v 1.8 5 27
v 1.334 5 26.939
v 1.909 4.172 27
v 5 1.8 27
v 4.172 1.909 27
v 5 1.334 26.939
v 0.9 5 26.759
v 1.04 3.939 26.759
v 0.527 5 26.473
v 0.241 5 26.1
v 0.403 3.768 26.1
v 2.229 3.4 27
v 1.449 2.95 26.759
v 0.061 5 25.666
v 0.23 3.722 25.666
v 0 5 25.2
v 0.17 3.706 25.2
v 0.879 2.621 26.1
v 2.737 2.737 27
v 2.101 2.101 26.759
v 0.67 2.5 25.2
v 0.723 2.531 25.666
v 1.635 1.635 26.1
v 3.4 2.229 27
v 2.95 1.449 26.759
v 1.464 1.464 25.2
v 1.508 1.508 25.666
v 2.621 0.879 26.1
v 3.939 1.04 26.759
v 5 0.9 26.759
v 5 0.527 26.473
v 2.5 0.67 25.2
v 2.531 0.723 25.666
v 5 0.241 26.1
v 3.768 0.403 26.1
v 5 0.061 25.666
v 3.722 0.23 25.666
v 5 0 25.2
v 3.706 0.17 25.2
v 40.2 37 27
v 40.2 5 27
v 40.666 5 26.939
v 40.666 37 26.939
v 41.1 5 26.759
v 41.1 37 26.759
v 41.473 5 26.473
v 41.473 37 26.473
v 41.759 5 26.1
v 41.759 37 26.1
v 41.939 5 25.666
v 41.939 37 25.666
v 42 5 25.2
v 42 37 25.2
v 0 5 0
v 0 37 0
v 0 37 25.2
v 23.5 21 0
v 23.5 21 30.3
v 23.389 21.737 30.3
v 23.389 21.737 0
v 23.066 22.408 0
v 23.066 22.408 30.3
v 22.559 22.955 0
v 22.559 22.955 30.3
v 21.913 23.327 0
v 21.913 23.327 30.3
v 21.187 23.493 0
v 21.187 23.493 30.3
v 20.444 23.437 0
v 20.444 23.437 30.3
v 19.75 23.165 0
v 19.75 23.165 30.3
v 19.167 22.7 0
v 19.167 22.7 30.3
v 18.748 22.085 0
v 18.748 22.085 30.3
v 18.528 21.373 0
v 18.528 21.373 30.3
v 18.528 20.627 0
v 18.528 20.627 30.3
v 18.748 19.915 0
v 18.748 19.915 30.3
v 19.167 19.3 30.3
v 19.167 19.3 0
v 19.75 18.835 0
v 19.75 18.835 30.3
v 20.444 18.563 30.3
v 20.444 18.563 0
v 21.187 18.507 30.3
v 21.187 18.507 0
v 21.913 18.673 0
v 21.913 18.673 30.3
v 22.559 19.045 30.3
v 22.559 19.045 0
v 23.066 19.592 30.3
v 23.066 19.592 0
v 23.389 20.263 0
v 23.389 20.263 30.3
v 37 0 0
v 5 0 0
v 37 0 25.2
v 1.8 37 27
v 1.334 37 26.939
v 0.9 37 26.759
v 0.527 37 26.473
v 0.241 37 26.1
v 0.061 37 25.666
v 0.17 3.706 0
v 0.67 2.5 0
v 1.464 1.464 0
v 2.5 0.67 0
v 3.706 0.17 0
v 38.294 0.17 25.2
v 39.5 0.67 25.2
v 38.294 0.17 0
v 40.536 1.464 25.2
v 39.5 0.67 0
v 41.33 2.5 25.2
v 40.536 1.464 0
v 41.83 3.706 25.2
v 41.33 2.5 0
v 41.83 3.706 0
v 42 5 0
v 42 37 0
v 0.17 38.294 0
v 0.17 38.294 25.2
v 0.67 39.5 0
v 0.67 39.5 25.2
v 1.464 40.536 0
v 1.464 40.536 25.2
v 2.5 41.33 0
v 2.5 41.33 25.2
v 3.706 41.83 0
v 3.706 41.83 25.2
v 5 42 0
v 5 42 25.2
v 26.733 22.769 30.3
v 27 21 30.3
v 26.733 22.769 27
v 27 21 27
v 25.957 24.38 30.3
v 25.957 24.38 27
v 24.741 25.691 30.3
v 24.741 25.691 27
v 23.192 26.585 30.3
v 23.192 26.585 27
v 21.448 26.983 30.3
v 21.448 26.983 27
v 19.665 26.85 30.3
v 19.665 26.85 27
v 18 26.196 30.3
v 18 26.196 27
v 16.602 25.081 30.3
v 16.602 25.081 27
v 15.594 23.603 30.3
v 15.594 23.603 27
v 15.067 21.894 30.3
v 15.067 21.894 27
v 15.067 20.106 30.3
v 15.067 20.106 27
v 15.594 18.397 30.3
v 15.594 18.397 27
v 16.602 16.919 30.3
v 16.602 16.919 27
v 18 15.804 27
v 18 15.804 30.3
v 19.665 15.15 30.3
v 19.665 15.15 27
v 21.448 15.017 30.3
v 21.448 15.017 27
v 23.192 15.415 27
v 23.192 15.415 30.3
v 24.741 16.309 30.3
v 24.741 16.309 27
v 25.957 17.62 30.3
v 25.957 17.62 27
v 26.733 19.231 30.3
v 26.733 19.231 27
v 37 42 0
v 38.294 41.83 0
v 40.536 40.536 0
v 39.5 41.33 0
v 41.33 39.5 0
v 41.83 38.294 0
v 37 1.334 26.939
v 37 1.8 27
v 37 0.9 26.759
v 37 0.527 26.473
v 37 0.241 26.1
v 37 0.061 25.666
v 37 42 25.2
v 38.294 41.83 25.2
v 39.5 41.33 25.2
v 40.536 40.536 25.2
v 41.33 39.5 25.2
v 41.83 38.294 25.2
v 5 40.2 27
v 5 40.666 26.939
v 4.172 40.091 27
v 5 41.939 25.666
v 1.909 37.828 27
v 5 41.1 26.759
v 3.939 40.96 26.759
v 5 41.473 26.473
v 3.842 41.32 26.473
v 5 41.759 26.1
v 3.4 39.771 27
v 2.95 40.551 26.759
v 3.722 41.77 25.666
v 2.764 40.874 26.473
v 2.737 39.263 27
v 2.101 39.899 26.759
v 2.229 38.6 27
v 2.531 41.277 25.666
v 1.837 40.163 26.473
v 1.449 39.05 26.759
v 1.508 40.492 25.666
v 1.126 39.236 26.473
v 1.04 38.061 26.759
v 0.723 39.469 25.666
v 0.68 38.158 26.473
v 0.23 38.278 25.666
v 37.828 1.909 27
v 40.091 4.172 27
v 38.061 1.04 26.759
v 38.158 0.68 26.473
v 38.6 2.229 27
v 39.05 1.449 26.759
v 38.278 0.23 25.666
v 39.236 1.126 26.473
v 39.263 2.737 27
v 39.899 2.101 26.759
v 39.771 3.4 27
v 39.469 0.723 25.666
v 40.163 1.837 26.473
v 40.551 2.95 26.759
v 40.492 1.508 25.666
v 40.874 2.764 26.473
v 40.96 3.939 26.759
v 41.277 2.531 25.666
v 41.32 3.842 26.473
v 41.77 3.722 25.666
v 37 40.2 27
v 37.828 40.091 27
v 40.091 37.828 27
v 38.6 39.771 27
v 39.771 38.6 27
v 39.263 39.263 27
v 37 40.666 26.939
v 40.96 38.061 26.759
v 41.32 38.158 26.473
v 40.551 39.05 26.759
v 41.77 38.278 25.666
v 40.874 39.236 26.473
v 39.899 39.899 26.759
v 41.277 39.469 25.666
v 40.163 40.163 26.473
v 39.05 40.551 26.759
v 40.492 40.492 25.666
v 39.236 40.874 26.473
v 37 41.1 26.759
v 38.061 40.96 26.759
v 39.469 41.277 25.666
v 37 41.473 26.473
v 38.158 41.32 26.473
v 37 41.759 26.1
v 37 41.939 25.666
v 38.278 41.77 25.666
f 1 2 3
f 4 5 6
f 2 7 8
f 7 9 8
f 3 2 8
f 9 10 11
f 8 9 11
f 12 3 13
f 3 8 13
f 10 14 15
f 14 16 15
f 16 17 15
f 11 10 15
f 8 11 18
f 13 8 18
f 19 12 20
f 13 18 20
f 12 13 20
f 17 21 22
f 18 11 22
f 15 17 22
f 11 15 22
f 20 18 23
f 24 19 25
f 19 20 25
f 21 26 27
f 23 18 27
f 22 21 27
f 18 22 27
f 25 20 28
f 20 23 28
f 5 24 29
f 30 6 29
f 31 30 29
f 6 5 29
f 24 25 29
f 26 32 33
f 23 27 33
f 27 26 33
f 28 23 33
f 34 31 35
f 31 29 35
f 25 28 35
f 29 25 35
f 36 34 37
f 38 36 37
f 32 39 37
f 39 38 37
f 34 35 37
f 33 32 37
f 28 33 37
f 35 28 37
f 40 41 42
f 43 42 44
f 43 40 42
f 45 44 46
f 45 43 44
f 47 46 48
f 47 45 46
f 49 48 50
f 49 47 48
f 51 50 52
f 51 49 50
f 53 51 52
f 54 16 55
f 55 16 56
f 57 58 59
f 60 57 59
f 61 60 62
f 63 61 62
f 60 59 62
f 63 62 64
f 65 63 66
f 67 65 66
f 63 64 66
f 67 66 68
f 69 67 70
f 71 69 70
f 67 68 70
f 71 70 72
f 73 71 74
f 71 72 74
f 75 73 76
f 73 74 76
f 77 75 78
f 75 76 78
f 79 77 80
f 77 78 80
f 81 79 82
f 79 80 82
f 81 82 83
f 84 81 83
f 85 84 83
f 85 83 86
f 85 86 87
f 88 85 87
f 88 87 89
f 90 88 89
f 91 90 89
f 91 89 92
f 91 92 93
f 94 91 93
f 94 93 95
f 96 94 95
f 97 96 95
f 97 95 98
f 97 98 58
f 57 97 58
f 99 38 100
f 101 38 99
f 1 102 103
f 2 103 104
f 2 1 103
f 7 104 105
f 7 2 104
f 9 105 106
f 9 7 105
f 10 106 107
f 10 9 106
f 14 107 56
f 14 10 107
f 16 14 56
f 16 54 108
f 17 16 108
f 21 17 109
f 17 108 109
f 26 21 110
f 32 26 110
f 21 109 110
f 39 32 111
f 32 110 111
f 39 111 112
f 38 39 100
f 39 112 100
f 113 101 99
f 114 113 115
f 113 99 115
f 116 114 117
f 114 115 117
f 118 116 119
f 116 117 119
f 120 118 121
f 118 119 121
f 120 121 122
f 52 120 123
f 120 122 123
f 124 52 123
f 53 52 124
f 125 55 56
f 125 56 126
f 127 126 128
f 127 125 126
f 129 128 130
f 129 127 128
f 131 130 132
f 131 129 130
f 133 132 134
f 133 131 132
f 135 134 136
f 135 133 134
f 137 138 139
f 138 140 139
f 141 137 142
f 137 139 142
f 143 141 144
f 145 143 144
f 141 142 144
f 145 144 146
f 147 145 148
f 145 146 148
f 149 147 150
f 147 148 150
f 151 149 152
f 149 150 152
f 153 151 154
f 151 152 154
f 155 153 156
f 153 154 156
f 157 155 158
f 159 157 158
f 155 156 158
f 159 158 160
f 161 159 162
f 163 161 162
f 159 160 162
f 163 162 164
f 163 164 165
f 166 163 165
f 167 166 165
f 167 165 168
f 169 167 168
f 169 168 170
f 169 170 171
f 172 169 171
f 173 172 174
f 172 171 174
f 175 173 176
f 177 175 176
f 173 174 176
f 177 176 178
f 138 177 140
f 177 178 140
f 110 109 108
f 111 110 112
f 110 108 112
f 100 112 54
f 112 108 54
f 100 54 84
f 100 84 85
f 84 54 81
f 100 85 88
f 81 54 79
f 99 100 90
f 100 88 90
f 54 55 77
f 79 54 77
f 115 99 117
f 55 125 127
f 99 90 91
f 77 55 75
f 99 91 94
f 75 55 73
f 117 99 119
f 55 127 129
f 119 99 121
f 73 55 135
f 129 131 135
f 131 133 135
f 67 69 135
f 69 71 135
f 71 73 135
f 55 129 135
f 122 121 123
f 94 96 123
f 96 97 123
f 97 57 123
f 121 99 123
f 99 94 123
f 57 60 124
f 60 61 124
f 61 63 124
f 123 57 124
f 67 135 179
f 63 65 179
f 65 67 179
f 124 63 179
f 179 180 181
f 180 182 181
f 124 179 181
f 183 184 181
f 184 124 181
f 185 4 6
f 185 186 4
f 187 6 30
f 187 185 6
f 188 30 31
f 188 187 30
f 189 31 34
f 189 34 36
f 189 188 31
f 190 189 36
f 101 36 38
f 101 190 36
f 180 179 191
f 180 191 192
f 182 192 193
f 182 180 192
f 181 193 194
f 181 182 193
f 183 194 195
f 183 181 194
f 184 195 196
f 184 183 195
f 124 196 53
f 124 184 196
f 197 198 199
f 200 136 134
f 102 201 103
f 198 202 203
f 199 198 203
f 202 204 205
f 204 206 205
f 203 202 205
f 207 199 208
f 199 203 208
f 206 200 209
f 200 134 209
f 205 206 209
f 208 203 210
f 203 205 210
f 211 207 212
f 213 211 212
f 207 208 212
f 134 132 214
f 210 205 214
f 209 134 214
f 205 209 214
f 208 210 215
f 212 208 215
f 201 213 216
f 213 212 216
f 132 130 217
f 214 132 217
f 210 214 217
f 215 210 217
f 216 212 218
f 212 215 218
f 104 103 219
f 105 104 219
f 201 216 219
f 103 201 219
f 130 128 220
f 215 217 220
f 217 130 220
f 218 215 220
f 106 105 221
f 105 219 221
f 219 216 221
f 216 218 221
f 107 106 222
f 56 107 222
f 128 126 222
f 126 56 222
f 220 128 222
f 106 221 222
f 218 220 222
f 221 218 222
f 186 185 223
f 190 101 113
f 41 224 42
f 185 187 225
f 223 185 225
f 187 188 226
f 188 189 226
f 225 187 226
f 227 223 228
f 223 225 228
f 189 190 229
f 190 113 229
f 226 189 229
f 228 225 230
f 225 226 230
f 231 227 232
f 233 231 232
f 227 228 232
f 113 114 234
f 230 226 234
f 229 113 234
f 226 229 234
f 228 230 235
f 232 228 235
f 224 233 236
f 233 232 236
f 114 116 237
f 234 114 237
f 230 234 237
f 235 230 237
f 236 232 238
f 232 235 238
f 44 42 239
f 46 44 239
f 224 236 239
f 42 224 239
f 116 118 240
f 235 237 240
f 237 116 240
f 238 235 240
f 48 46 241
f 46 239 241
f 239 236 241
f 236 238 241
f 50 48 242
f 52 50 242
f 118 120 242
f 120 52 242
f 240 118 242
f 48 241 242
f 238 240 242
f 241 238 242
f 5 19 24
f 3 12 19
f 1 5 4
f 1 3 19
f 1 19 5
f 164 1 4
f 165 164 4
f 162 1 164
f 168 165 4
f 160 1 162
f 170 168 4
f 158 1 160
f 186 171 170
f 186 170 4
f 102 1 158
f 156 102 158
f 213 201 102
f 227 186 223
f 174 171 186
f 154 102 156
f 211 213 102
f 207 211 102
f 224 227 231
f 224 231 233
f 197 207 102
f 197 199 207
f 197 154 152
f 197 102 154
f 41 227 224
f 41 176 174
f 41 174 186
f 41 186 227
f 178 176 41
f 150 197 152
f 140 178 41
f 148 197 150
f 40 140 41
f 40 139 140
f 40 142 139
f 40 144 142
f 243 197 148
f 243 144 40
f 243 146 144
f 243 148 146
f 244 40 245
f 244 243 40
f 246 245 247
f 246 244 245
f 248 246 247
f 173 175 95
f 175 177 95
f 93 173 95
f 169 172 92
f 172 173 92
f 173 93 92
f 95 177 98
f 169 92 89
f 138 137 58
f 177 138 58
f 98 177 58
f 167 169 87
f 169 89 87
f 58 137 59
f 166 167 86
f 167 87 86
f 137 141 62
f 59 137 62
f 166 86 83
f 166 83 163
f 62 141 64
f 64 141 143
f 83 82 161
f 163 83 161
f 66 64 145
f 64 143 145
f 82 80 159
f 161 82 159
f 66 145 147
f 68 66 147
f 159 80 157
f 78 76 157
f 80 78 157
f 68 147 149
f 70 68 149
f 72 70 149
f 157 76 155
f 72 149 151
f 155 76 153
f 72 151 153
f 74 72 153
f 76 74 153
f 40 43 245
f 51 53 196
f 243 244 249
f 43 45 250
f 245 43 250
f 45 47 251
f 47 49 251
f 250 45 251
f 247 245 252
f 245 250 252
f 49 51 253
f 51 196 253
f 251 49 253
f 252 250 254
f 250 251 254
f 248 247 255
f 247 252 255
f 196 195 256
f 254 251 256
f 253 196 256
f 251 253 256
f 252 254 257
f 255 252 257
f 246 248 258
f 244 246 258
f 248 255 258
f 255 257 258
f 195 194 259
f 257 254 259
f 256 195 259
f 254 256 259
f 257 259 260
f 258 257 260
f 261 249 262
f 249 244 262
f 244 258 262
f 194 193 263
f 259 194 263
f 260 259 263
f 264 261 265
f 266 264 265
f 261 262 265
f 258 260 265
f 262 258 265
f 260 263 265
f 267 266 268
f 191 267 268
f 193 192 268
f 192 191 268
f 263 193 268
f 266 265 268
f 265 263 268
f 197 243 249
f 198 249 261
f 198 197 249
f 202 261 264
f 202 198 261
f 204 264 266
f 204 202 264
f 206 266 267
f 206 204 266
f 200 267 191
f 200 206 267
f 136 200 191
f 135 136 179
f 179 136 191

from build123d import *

# Parameters (mm, degrees)
CROQUIS1_W              = 42
CROQUIS1_H              = 42
SALIENTE_EXTRUIR1_DEPTH = 27
REDONDEO1_R             = 5
REDONDEO2_R             = 1.8
CROQUIS4_R              = 2.5
CORTAR_EXTRUIR1_DEPTH   = 38.8


with BuildPart() as part:
    # Croquis1 → Saliente-Extruir1 (new body)
    with BuildSketch(Plane.XY.offset(27)):
        with Locations((21, 21)):
            Rectangle(CROQUIS1_W, CROQUIS1_H)
    extrude(amount=-SALIENTE_EXTRUIR1_DEPTH)

    # Croquis2 → Revolución1 (revolve)
    with BuildSketch(Plane(origin=(0, 21, 0), x_dir=(1, 0, 0), z_dir=(0, 1, 0))):
        Polygon((27, -27), (21, -27), (21, -37.8), (23.5, -37.8), (23.5, -30.3), (27, -30.3), align=None)
    revolve(axis=Axis((21, 21, 27), (0, 0, 1)))

    # Redondeo1
    redondeo1_edges = [part.edges().sort_by_distance(p)[0] for p in [
        (42, 0, 13.5),
        (0, 0, 13.5),
        (0, 42, 13.5),
        (42, 42, 13.5),
    ]]
    fillet(redondeo1_edges, radius=REDONDEO1_R)

    # Redondeo2
    redondeo2_edges = [part.edges().sort_by_distance(p)[0] for p in [
        (21, 0, 27),
        (42, 21, 27),
        (21, 42, 27),
        (0, 21, 27),
        (40.535533906, 40.535533906, 27),
        (1.464466094, 1.464466094, 27),
        (1.464466094, 40.535533906, 27),
        (40.535533906, 1.464466094, 27),
    ]]
    fillet(redondeo2_edges, radius=REDONDEO2_R)

    # Croquis4 → Cortar-Extruir1 (cut, through all)
    with BuildSketch(Plane.XY.offset(37.8)):
        with Locations((21, 21)):
            Circle(CROQUIS4_R)
    extrude(amount=-CORTAR_EXTRUIR1_DEPTH, mode=Mode.SUBTRACT)


solid = part.part
